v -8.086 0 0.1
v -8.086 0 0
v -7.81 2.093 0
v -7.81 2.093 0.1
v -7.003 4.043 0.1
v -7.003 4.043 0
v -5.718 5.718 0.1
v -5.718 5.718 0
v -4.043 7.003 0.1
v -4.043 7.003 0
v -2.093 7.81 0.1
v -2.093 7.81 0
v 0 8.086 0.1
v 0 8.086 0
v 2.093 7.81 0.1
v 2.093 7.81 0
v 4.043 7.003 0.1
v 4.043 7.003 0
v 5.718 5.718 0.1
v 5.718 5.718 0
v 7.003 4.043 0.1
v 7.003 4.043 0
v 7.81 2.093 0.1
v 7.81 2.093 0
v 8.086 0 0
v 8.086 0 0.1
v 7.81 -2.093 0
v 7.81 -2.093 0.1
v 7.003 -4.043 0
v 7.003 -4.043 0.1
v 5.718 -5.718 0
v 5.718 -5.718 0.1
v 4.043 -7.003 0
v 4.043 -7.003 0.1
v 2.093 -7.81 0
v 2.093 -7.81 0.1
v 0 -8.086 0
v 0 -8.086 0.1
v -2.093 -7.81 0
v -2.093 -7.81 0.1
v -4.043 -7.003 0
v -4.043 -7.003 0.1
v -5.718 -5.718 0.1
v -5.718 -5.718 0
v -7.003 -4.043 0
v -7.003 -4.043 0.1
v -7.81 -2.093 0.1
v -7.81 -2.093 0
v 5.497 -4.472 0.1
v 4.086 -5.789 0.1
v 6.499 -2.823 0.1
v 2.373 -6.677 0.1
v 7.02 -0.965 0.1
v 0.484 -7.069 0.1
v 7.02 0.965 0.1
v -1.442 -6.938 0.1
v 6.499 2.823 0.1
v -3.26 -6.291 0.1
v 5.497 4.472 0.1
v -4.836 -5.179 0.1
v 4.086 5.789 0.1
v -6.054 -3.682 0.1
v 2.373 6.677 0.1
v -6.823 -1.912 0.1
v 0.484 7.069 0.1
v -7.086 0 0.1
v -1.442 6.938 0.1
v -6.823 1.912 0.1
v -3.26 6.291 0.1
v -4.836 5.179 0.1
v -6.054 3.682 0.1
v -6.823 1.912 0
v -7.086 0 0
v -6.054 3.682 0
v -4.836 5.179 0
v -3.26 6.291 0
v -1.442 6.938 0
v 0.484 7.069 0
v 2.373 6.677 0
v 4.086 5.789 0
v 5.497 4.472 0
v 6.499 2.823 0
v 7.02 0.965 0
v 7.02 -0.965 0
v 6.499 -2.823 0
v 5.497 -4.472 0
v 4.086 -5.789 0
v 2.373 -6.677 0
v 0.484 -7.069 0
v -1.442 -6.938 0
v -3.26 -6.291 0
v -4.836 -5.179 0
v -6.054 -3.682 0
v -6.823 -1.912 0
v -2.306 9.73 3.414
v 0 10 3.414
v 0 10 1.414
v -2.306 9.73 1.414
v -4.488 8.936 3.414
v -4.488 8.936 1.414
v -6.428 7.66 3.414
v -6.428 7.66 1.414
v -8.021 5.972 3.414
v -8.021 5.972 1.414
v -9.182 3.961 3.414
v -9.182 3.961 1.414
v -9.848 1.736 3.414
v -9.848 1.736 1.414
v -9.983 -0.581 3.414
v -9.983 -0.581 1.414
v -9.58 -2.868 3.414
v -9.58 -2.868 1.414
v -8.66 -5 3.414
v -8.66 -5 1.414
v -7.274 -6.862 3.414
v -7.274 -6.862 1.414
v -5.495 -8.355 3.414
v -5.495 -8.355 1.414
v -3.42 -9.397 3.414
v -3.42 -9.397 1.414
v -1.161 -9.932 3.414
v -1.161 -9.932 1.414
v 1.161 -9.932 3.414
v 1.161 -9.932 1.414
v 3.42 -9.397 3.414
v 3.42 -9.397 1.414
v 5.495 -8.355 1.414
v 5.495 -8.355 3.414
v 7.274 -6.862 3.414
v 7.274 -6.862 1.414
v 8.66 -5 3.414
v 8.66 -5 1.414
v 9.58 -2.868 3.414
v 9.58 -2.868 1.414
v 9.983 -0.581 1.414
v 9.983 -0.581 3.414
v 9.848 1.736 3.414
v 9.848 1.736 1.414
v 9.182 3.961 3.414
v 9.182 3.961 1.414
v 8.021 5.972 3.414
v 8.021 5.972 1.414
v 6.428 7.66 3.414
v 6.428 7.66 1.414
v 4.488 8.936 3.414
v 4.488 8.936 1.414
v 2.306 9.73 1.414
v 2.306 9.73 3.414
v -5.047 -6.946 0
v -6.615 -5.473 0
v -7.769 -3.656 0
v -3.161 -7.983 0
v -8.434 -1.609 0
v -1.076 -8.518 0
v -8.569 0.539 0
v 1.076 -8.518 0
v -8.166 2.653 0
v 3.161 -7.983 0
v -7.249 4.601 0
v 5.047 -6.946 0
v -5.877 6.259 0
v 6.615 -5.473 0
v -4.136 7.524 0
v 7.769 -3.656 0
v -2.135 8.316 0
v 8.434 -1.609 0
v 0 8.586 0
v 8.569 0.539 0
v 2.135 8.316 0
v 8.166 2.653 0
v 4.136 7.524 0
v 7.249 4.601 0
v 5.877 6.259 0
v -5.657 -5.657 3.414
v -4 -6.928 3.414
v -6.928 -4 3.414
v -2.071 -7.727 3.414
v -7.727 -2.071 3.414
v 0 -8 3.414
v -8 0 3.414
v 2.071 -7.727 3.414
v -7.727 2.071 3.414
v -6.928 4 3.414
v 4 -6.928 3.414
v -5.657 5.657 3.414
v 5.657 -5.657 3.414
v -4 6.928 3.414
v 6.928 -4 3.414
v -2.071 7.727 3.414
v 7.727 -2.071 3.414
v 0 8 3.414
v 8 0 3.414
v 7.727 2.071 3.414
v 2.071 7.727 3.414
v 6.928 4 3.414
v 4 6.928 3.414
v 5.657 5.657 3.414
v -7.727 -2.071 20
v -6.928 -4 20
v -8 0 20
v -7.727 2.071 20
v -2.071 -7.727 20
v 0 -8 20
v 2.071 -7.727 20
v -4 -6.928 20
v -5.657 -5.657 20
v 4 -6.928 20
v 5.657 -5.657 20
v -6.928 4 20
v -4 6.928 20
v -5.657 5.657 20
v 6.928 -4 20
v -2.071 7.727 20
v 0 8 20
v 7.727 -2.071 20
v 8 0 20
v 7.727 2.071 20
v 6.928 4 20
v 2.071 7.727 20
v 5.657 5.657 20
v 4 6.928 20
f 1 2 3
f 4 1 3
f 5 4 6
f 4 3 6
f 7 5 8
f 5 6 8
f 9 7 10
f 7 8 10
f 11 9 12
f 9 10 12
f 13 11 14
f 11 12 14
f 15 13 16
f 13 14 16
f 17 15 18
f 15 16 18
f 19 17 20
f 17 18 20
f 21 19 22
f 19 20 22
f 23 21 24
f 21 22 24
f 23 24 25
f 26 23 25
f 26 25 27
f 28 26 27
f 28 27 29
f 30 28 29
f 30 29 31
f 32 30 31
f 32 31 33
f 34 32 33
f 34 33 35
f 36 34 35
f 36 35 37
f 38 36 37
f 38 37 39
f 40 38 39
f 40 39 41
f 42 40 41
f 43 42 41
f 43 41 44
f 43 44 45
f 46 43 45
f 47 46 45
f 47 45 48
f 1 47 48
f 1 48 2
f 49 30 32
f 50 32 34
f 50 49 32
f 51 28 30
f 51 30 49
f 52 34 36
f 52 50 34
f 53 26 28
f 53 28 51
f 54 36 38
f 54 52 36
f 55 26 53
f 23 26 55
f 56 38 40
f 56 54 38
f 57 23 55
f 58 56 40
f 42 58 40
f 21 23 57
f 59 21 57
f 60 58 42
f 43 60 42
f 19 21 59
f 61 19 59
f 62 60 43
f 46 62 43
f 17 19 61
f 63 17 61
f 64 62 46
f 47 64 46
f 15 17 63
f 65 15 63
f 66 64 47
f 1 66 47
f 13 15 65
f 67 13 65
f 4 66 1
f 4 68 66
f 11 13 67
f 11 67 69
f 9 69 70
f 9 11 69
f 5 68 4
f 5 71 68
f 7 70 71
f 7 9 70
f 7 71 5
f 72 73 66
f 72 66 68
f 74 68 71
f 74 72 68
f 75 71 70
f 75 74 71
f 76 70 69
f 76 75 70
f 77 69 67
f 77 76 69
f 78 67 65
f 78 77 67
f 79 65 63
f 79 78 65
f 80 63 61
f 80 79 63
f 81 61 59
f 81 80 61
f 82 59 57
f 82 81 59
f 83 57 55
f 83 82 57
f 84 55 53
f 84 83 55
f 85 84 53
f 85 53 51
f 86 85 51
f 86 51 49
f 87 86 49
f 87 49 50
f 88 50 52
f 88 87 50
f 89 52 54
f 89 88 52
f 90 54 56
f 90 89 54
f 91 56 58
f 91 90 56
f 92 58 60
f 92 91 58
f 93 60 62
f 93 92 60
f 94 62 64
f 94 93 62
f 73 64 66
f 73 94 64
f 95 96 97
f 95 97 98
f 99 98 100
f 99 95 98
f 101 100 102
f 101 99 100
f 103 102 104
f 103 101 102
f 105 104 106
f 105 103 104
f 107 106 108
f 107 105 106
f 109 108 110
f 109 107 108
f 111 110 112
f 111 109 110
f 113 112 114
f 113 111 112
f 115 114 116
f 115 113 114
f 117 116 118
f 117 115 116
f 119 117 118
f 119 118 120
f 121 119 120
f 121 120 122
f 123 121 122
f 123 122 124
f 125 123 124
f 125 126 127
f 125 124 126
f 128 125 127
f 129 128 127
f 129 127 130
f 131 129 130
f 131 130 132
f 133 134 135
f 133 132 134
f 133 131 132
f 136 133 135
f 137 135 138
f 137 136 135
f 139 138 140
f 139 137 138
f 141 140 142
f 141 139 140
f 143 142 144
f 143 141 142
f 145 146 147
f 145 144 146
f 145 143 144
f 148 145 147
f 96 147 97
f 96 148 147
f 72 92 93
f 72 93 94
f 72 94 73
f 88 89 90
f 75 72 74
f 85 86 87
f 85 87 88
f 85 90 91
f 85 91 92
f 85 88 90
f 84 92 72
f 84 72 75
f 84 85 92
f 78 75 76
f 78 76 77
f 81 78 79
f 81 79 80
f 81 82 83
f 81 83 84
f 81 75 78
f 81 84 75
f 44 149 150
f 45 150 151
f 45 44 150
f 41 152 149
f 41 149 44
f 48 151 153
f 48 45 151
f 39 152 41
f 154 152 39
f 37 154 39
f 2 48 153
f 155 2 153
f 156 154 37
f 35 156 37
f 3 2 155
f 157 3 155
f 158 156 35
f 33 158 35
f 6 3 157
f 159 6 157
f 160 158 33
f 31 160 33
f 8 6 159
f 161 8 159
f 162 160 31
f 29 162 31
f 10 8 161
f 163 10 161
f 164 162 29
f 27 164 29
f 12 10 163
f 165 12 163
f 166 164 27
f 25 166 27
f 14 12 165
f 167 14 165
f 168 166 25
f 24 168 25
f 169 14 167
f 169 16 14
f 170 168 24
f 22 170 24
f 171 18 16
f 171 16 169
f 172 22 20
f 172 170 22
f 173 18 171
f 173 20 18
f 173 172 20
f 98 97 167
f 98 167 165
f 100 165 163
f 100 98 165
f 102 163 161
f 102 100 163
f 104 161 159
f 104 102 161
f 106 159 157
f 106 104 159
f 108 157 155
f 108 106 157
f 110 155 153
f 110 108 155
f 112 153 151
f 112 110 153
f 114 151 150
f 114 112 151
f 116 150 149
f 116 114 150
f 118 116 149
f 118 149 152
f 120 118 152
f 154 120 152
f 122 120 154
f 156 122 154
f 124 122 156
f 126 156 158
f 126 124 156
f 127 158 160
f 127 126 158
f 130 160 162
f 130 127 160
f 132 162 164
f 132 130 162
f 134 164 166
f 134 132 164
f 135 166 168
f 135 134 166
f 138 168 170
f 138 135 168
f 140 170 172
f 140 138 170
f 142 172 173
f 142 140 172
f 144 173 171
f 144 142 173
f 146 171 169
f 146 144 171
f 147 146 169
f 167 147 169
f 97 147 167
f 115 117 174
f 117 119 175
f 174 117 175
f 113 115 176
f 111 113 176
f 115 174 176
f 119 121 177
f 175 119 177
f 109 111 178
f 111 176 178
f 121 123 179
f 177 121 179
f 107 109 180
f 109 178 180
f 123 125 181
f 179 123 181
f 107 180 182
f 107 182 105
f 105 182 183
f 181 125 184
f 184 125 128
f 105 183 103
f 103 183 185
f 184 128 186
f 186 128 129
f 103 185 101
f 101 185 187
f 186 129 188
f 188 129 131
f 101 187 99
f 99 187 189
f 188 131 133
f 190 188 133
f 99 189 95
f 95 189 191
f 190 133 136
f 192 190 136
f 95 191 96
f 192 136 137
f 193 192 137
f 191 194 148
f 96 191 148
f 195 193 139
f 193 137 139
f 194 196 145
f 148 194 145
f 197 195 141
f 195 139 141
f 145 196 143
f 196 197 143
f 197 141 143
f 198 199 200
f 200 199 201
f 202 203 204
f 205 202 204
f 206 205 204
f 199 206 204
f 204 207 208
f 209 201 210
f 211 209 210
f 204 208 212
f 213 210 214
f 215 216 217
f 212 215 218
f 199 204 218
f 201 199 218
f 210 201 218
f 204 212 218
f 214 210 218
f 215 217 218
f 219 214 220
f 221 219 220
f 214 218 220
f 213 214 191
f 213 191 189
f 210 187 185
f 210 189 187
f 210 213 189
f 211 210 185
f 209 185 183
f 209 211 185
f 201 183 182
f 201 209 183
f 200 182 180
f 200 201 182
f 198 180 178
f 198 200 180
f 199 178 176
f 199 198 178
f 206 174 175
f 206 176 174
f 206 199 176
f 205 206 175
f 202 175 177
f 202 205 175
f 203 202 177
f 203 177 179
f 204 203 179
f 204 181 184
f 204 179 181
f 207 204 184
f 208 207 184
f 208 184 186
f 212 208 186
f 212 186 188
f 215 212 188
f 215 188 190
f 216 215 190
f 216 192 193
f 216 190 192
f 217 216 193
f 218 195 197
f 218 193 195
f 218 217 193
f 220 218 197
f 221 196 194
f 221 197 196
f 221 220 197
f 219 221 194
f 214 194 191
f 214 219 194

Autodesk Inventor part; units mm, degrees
ref_plane "YZ Plane" through (0, 0, 0) normal (1, 0, 0) x (0, 1, 0)
ref_plane "XZ Plane" through (0, 0, 0) normal (0, 1, 0) x (-1, 0, 0)
ref_plane "XY Plane" through (0, 0, 0) normal (0, 0, 1) x (1, 0, 0)
sketch "Sketch1" plane through (0, 0, 0) normal (1, 0, 0) x (0, 1, 0)
  line L0 (0, 0) -> (8.5858, 0)
  line L1 (8.5858, 0) -> (10, 1.4142)
  line L2 (10, 1.4142) -> (10, 3.4142)
  line L3 (10, 3.4142) -> (8, 3.4142)
  line L4 (8, 3.4142) -> (8, 20)
  line L5 (8, 20) -> (0, 20)
  line L6 (0, 20) -> (0, 0)
  dimension "d1" = 16
  dimension "d2" = 2
  dimension "d3" = 2
  dimension "d4" = 45
  dimension "d5" = 20
revolve "Revolution1" add sketch "Sketch1" angle 360 about axis through (0, 0, 20) along (0, 0, -1)
sketch "Sketch2" plane through (0, 0, 0) normal (0, 0, -1) x (-1, 0, 0)
  circle A0 centre (0, 0) radius 8.5858 projected
  circle A1 centre (0, 0) radius 8.0858
  circle A2 centre (0, 0) radius 7.0858
  dimension "d7" = 0.5
  dimension "d8" = 1
extrude "Extrusion1" cut sketch "Sketch2" against normal blind 0.1 contours A1
properties part number "Power Button" material "Stainless Steel"
